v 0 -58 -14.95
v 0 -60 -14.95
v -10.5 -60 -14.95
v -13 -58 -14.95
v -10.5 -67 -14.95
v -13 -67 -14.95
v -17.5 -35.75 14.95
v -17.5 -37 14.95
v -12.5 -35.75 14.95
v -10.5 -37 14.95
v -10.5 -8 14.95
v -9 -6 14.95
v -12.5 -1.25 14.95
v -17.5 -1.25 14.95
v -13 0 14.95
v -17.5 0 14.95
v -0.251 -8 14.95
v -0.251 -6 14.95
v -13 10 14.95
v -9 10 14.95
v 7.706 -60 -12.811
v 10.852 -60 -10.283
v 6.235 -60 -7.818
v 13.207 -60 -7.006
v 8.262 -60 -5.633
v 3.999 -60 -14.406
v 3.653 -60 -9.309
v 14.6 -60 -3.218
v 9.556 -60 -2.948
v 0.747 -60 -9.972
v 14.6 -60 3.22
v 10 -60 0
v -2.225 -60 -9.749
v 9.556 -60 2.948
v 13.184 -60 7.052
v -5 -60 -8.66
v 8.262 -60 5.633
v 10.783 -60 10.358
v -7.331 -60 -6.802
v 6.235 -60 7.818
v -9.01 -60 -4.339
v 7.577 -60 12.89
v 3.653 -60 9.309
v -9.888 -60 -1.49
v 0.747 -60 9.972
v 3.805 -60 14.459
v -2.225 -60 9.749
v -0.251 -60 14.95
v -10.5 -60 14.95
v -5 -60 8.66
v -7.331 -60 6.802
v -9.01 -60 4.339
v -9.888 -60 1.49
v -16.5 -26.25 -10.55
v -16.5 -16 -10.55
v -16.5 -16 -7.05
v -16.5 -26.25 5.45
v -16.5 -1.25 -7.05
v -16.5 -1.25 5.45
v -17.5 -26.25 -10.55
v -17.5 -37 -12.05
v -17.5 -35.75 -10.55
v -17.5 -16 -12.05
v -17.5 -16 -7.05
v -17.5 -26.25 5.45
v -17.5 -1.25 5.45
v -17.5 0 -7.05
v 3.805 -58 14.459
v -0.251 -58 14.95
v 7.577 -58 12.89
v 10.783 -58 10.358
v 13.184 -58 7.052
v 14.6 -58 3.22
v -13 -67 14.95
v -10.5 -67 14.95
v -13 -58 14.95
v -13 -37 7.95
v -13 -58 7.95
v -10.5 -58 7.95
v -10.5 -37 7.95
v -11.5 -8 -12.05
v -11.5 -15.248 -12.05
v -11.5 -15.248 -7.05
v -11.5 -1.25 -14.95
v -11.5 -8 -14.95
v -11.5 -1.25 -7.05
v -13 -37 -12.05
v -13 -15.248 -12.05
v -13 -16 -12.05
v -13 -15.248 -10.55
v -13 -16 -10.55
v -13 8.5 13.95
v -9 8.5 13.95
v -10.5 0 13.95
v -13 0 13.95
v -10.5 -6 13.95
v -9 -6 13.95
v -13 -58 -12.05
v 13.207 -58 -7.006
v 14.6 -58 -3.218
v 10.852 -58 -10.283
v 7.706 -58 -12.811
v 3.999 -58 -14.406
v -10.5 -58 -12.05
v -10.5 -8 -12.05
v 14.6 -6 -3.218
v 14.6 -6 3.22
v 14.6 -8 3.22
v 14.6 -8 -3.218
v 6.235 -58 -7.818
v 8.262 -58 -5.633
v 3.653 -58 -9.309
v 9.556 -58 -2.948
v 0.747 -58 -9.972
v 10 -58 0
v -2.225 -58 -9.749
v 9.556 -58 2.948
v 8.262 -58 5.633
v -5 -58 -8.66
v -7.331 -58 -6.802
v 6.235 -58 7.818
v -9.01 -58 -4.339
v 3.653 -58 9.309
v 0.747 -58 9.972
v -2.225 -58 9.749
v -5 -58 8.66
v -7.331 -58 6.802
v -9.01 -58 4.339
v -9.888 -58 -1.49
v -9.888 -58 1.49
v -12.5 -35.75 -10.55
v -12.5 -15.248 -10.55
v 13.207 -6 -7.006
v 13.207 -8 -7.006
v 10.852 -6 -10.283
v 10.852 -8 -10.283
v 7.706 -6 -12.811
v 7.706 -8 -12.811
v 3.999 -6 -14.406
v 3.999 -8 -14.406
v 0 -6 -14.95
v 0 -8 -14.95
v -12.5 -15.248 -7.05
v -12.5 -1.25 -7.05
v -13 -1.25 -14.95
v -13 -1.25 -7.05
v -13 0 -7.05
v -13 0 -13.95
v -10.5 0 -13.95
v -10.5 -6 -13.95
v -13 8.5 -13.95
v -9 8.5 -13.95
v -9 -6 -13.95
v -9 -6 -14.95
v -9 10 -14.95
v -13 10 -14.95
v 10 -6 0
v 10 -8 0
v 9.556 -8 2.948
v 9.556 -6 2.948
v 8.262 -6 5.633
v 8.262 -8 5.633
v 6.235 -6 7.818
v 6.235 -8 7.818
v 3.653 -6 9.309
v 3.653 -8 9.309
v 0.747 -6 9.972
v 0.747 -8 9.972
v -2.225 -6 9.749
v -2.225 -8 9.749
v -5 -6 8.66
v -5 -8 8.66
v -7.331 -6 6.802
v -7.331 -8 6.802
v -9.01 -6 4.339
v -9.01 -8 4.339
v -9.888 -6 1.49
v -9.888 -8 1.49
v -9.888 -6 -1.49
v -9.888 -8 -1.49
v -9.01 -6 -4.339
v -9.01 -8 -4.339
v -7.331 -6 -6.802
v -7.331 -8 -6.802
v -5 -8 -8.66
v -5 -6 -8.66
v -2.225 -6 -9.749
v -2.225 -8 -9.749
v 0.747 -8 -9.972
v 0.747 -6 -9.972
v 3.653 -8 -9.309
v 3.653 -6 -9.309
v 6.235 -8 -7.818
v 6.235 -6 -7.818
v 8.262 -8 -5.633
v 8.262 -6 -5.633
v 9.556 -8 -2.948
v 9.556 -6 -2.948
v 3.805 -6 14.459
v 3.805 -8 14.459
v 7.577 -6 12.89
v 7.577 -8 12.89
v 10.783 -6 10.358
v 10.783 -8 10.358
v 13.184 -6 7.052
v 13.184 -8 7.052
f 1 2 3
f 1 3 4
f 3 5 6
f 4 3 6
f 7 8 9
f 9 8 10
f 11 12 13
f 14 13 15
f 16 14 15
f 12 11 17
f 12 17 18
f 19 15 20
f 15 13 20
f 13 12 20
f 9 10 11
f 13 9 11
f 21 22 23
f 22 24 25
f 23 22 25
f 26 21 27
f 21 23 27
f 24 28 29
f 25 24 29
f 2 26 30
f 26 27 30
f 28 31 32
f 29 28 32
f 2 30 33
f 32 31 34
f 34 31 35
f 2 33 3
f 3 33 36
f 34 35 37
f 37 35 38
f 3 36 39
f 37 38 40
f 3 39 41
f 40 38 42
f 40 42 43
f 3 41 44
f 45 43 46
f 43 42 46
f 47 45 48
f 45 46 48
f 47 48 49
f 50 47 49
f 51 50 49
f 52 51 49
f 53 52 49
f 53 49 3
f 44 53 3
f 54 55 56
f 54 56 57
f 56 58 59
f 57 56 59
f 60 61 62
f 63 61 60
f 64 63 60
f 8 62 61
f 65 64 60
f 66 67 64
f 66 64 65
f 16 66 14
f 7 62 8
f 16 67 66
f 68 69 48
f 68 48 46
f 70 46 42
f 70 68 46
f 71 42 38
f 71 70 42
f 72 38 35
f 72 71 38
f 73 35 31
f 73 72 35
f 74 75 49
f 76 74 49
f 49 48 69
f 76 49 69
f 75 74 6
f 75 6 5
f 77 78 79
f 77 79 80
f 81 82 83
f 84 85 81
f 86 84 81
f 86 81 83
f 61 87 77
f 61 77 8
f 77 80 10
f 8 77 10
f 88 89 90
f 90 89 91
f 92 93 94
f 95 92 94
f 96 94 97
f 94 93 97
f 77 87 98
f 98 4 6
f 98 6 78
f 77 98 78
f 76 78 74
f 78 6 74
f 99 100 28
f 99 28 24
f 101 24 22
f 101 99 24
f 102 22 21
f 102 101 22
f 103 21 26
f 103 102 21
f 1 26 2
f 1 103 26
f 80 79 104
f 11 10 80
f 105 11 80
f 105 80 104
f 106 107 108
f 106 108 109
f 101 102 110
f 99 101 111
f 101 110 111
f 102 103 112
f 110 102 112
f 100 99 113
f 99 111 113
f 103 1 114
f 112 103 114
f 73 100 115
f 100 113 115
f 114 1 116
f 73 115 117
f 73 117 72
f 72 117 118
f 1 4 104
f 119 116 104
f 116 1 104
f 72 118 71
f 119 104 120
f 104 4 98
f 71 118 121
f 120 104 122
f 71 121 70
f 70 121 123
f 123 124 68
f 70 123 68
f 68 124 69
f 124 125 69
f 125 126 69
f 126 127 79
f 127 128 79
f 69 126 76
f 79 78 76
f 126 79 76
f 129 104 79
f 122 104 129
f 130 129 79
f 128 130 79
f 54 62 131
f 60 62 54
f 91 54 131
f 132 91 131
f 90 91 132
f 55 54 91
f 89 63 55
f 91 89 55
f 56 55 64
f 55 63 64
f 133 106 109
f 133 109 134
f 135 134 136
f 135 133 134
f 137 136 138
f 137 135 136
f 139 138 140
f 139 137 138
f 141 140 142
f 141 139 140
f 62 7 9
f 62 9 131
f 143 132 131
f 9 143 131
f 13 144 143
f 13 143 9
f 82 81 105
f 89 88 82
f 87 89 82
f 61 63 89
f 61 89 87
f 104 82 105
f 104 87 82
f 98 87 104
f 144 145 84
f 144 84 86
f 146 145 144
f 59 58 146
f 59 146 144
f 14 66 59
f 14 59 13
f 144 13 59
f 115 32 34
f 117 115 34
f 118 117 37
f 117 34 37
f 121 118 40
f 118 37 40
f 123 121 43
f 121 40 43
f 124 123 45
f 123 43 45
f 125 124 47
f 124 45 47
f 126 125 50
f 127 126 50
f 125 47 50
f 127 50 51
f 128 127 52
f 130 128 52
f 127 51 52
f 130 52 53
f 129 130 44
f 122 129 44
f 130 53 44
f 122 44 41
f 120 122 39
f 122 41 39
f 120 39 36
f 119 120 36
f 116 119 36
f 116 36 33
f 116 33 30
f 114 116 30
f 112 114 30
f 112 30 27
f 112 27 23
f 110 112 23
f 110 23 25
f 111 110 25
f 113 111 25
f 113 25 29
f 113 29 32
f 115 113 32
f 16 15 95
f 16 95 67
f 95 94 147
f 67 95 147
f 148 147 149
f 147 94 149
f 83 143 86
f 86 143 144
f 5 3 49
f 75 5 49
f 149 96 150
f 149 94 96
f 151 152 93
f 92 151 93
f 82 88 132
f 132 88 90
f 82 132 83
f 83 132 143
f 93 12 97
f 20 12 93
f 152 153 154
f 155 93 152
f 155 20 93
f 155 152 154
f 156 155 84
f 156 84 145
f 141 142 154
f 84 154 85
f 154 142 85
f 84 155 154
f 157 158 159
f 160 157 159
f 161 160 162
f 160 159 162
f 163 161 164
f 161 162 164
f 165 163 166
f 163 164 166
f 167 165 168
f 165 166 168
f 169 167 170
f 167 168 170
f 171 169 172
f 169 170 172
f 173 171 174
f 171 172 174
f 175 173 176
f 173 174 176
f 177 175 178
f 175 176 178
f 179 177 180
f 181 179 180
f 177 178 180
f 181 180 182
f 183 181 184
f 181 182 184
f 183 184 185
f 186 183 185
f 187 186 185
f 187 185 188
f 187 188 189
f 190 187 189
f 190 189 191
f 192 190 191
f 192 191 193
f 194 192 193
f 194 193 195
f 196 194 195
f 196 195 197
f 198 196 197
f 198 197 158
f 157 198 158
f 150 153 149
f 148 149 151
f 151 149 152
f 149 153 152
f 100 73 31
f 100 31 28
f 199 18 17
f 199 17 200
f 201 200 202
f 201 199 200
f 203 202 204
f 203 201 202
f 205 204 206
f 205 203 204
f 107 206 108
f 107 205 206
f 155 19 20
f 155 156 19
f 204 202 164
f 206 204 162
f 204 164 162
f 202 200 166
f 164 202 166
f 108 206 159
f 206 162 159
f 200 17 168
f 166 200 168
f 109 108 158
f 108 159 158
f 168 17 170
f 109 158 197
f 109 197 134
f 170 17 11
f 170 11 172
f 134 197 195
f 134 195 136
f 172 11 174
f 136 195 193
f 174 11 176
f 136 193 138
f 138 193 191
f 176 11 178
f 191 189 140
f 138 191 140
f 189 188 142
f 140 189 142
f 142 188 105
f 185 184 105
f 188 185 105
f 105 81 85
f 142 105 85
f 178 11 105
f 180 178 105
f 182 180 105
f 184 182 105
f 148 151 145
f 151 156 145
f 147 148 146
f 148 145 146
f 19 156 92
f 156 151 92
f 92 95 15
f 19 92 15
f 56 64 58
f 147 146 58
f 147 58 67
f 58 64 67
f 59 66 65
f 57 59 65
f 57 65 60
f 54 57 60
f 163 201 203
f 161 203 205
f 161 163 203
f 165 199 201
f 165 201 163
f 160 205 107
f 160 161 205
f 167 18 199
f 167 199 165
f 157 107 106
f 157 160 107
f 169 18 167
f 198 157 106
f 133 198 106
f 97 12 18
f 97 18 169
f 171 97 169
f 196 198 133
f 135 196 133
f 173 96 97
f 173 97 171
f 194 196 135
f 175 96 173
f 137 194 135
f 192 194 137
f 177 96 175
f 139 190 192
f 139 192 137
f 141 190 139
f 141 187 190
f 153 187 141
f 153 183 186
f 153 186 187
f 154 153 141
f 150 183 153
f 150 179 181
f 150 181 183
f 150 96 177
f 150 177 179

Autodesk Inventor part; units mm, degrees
ref_plane "YZ Plane" through (0, 0, 0) normal (1, 0, 0) x (0, 1, 0)
ref_plane "XZ Plane" through (0, 0, 0) normal (0, 1, 0) x (-1, 0, 0)
ref_plane "XY Plane" through (0, 0, 0) normal (0, 0, 1) x (1, 0, 0)
sketch "Sketch1" plane through (0, 0, 0) normal (0, 1, 0) x (-1, 0, 0)
  line L0 (13, 14.9495) -> (0, 14.9495)
  line L1 (0, -14.9505) -> (13, -14.9505)
  line L2 (13, -14.9505) -> (13, 14.9495)
  arc A0 (-14.7414, -2.4918) -> (0, -14.9505) centre (0, 0) ccw
  arc A1 (0.2506, 14.9495) -> (-14.7414, -2.4918) centre (-0.0002, 0.001) ccw
  point P0 (13, -0.0005)
  dimension "d0" = 29.9
  dimension "d1" = 0
  dimension "d2" = 0
extrude "Extrusion1" add sketch "Sketch1" against normal blind 60
sketch "Sketch2" plane through (0, -60, 0) normal (0, -1, 0) x (1, 0, 0)
  circle A0 centre (0, 0) radius 10
  dimension "d5" = 20
extrude "Extrusion2" cut sketch "Sketch2" against normal through all
sketch "Sketch3" plane through (0, 0, 0) normal (0, 1, 0) x (1, 0, 0)
  line L0 (-13, -14.9495) -> (-13, 14.9505) projected
  line L1 (-0.2506, -14.9495) -> (-13, -14.9495) projected
  line L2 (-13, 14.9505) -> (-10.5, 14.9505)
  line L3 (-10.5, 14.9505) -> (-10.5, -14.9495)
  line L4 (-10.5, -14.9495) -> (-13, -14.9495)
  line L5 (-13, -14.9495) -> (-13, 14.9505)
  point P0 (0, 0)
  point P1 (0, -15)
  dimension "d8" = 2.5
extrude "Extrusion3" add sketch "Sketch3" against normal blind 67
sketch "Sketch4" plane through (-10.5, -67, 14.9495) normal (1, 0, 0) x (0, 0, -1)
  line L0 (-3.796, 59) -> (37.1499, 59)
  line L1 (37.1499, 59) -> (37.1499, 9)
  line L2 (37.1499, 9) -> (-3.796, 9)
  line L3 (-3.796, 9) -> (-3.796, 59)
  line L4 (29.9, 67) -> (0, 67) projected
  line L5 (0, 7) -> (29.9, 7) projected
  point P0 (14.9495, 67)
  dimension "d31" = 2
  dimension "d44" = 50
extrude "Extrusion4" cut sketch "Sketch4" along normal through all
sketch "Sketch5" plane through (0, 0, 0) normal (0, 1, 0) x (1, 0, 0)
  line L0 (-13, 14.9505) -> (-13, -14.9495) projected
  line L1 (-10.5, 14.9505) -> (0, 14.9505) projected
  line L2 (-13, -14.9495) -> (-9, -14.9495)
  line L3 (-9, -14.9495) -> (-9, 14.9505)
  line L4 (-9, 14.9505) -> (-13, 14.9505)
  line L5 (-13, 14.9505) -> (-13, -14.9495)
  point P0 (0, 0)
  dimension "d13" = 4
extrude "Extrusion5" add sketch "Sketch5" along normal blind 10
sketch "Sketch6" plane through (-9, 0, 4.3589) normal (1, 0, 0) x (0, 0, -1)
  line L0 (0, 0) -> (-10.5906, 0) projected
  line L1 (-9.5906, 0) -> (18.3094, 0)
  line L2 (18.3094, 0) -> (18.3094, 8.5)
  line L3 (18.3094, 8.5) -> (-9.5906, 8.5)
  line L4 (-9.5906, 8.5) -> (-9.5906, 0)
  line L5 (19.3094, 0) -> (19.3094, 10) projected
  line L6 (-10.5906, 0) -> (-10.5906, 10) projected
  line L7 (-10.5906, 10) -> (19.3094, 10) projected
  point P0 (4.3589, 0)
  point P1 (19.3094, 5)
  dimension "d35" = 1
  dimension "d36" = 1
  dimension "d37" = 1.5
extrude "Extrusion6" cut sketch "Sketch6" against normal through all
sketch "Sketch7" plane through (-13, -67, -14.9505) normal (-1, 0, 0) x (0, 0, 1)
  line L0 (29.9, 67) -> (2.9, 67)
  line L1 (2.9, 67) -> (2.9, 30)
  line L2 (2.9, 30) -> (29.9, 30)
  line L3 (29.9, 30) -> (29.9, 67)
  line L4 (28.9, 67) -> (1, 67) projected
  line L5 (29.9, 0) -> (29.9, 77) projected
  line L6 (0, 0) -> (0, 77) projected
  point P0 (14.9505, 67)
  dimension "d54" = 37
  dimension "d55" = 27
  dimension "d57" = 0
  dimension "d60" = 0
extrude "Extrusion7" add sketch "Sketch7" along normal blind 4.5
sketch "Sketch8" plane through (-17.5, -67, -14.9505) normal (-1, 0, 0) x (0, 0, 1)
  line L0 (4.4, 65.75) -> (29.9, 65.75)
  line L1 (29.9, 65.75) -> (29.9, 31.25)
  line L2 (29.9, 31.25) -> (4.4, 31.25)
  line L3 (4.4, 31.25) -> (4.4, 65.75)
  line L4 (29.9, 30) -> (29.9, 67) projected
  line L5 (2.9, 30) -> (29.9, 30) projected
  point P0 (14.9505, 67)
  dimension "d61" = 0
  dimension "d62" = 34.5
  dimension "d63" = 25.5
  dimension "d64" = 1.25
extrude "Extrusion8" cut sketch "Sketch8" against normal blind 5
sketch "Sketch10" plane through (-10.5, -67, 14.9495) normal (1, 0, 0) x (0, 0, -1)
  line L0 (1, 67) -> (28.9, 67)
  line L1 (28.9, 67) -> (28.9, 61)
  line L2 (28.9, 61) -> (1, 61)
  line L3 (1, 61) -> (1, 67)
  line L4 (30, 59) -> (0, 59) projected
  line L5 (29.9, 67) -> (29.9, 77) projected
  line L6 (0, 67) -> (0, 77) projected
  point P0 (14.9495, 67)
  point P1 (1, 64)
  dimension "d45" = 2
  dimension "d46" = 6
  dimension "d48" = 1
  dimension "d50" = 1
extrude "Extrusion10" cut sketch "Sketch10" along normal through all
sketch "Sketch11" plane through (-9, 0, -14.9505) normal (1, 0, 0) x (0, 0, -1)
  line L0 (0, -67) -> (0, 10) projected
  line L1 (-30, 0) -> (-30, -8) projected
  line L2 (0, 1.2785) -> (-30, 1.2785)
  line L3 (-30, 1.2785) -> (-30, -6)
  line L4 (-30, -6) -> (0, -6)
  line L5 (0, -6) -> (0, 1.2785)
  line L6 (0, -8) -> (-30, -8) projected
  point P0 (-14.9505, 0)
  point P1 (0, -6)
  dimension "d51" = 2
extrude "Extrusion11" cut sketch "Sketch11" along normal through all contours L4 L1 L3 L2 L0
sketch "Sketch12" plane through (-17.5, -67, -14.9505) normal (-1, 0, 0) x (0, 0, 1)
  line L0 (2.9, 30) -> (2.9, 67) projected
  line L1 (2.9, 67) -> (20.4, 67)
  line L2 (20.4, 67) -> (20.4, 40.75)
  line L3 (20.4, 40.75) -> (2.9, 40.75)
  line L4 (2.9, 40.75) -> (2.9, 67)
  line L5 (4.4, 31.25) -> (4.4, 65.75) projected
  line L6 (4.4, 65.75) -> (29.9, 65.75) projected
  point P0 (14.9505, 67)
  point P1 (2.9, 40.75)
  dimension "d67" = 16
  dimension "d68" = 25
extrude "Extrusion12" add sketch "Sketch12" against normal blind 1
sketch "Sketch13" plane through (-13, -35.75, 14.9495) normal (-1, 0, 0) x (0, 0, 1)
  line L0 (0, 0) -> (-25.5, 0) projected
  line L1 (0, 0) -> (-7, 0)
  line L2 (-7, 0) -> (-7, 13)
  line L3 (-7, 13) -> (0, 13)
  line L4 (0, 13) -> (0, 0)
  point P0 (-14.9495, 35.75)
  dimension "d76" = 7
  dimension "d77" = 13
extrude "Extrusion13" [suppressed]
sketch "Sketch14" plane through (-17.5, -67, -14.9505) normal (-1, 0, 0) x (0, 0, 1)
  line L0 (7.9, 67) -> (2.9, 67)
  line L1 (2.9, 67) -> (2.9, 51)
  line L2 (2.9, 51) -> (7.9, 51)
  line L3 (7.9, 51) -> (7.9, 67)
  line L4 (2.9, 67) -> (2.9, 30) projected
  line L5 (29.9, 67) -> (2.9, 67) projected
  point P0 (14.9505, 67)
  dimension "d73" = 16
  dimension "d74" = 0
  dimension "d75" = 5
  dimension "d113" = 0
extrude "Extrusion14" cut sketch "Sketch14" against normal up to surface (4.5 mm away)
sketch "Sketch15" plane through (-13, -67, -14.9505) normal (-1, 0, 0) x (0, 0, 1)
  line L0 (29.9, 9) -> (0, 9) projected
  line L1 (0, 59) -> (2.9, 59)
  line L2 (2.9, 59) -> (2.9, 9)
  line L3 (2.9, 9) -> (0, 9)
  line L4 (0, 9) -> (0, 59)
  line L5 (2.9, 51) -> (2.9, 30) projected
  line L6 (0, 0) -> (0, 77) projected
  point P0 (14.9505, 67)
  dimension "d90" = 0
  dimension "d91" = 0
extrude "Extrusion15" cut sketch "Sketch15" against normal through all
sketch "Sketch16" plane through (-13, -67, -14.9505) normal (-1, 0, 0) x (0, 0, 1)
  line L0 (29.9, 30) -> (2.9, 30) projected
  line L1 (29.9, 9) -> (22.9, 9)
  line L2 (22.9, 9) -> (22.9, 30)
  line L3 (22.9, 30) -> (29.9, 30)
  line L4 (29.9, 30) -> (29.9, 9)
  line L5 (29.9, 0) -> (29.9, 30) projected
  point P0 (14.9505, 67)
  dimension "d82" = 0
  dimension "d83" = 7
extrude "Extrusion16" cut sketch "Sketch16" against normal through all
sketch "Sketch18" plane through (-10.5, -6, 13.9495) normal (0, 1, 0) x (1, 0, 0)
  line L0 (26.137, 9.211) -> (25.1, 9.211)
  line L1 (25.1, 9.211) -> (25.1, 19.211)
  line L2 (25.1, 19.211) -> (26.137, 19.211)
  line L3 (26.137, 19.211) -> (26.137, 9.211)
  arc A0 (10.5, -1) -> (10.5, 29) centre (10.5, 14) ccw projected
  point P0 (10.5, 13.9495)
  point P1 (25.1, 14.211)
  point P2 (25.5, 14)
  point P3 (25.6185, 19.211)
  point P4 (25.6185, 9.211)
  dimension "d88" = 10
  dimension "d89" = 14.6
extrude "Extrusion17" cut sketch "Sketch18" against normal through all
sketch "Sketch19" plane through (-13, -8, -14.9505) normal (-1, 0, 0) x (0, 0, 1)
  line L0 (20.4, 6.75) -> (29.9, 6.75) projected
  line L1 (-1.6421, -7.2479) -> (7.9, -7.2479)
  line L2 (7.9, -7.2479) -> (7.9, 6.75)
  line L3 (7.9, 6.75) -> (-1.6421, 6.75)
  line L4 (-1.6421, 6.75) -> (-1.6421, -7.2479)
  point P0 (14.9505, 8)
  point P1 (2.9, 6.75)
  point P2 (2.9, 6.75)
extrude "Extrusion18" cut sketch "Sketch19" against normal blind 1.5
properties part number "Part4-2option"
